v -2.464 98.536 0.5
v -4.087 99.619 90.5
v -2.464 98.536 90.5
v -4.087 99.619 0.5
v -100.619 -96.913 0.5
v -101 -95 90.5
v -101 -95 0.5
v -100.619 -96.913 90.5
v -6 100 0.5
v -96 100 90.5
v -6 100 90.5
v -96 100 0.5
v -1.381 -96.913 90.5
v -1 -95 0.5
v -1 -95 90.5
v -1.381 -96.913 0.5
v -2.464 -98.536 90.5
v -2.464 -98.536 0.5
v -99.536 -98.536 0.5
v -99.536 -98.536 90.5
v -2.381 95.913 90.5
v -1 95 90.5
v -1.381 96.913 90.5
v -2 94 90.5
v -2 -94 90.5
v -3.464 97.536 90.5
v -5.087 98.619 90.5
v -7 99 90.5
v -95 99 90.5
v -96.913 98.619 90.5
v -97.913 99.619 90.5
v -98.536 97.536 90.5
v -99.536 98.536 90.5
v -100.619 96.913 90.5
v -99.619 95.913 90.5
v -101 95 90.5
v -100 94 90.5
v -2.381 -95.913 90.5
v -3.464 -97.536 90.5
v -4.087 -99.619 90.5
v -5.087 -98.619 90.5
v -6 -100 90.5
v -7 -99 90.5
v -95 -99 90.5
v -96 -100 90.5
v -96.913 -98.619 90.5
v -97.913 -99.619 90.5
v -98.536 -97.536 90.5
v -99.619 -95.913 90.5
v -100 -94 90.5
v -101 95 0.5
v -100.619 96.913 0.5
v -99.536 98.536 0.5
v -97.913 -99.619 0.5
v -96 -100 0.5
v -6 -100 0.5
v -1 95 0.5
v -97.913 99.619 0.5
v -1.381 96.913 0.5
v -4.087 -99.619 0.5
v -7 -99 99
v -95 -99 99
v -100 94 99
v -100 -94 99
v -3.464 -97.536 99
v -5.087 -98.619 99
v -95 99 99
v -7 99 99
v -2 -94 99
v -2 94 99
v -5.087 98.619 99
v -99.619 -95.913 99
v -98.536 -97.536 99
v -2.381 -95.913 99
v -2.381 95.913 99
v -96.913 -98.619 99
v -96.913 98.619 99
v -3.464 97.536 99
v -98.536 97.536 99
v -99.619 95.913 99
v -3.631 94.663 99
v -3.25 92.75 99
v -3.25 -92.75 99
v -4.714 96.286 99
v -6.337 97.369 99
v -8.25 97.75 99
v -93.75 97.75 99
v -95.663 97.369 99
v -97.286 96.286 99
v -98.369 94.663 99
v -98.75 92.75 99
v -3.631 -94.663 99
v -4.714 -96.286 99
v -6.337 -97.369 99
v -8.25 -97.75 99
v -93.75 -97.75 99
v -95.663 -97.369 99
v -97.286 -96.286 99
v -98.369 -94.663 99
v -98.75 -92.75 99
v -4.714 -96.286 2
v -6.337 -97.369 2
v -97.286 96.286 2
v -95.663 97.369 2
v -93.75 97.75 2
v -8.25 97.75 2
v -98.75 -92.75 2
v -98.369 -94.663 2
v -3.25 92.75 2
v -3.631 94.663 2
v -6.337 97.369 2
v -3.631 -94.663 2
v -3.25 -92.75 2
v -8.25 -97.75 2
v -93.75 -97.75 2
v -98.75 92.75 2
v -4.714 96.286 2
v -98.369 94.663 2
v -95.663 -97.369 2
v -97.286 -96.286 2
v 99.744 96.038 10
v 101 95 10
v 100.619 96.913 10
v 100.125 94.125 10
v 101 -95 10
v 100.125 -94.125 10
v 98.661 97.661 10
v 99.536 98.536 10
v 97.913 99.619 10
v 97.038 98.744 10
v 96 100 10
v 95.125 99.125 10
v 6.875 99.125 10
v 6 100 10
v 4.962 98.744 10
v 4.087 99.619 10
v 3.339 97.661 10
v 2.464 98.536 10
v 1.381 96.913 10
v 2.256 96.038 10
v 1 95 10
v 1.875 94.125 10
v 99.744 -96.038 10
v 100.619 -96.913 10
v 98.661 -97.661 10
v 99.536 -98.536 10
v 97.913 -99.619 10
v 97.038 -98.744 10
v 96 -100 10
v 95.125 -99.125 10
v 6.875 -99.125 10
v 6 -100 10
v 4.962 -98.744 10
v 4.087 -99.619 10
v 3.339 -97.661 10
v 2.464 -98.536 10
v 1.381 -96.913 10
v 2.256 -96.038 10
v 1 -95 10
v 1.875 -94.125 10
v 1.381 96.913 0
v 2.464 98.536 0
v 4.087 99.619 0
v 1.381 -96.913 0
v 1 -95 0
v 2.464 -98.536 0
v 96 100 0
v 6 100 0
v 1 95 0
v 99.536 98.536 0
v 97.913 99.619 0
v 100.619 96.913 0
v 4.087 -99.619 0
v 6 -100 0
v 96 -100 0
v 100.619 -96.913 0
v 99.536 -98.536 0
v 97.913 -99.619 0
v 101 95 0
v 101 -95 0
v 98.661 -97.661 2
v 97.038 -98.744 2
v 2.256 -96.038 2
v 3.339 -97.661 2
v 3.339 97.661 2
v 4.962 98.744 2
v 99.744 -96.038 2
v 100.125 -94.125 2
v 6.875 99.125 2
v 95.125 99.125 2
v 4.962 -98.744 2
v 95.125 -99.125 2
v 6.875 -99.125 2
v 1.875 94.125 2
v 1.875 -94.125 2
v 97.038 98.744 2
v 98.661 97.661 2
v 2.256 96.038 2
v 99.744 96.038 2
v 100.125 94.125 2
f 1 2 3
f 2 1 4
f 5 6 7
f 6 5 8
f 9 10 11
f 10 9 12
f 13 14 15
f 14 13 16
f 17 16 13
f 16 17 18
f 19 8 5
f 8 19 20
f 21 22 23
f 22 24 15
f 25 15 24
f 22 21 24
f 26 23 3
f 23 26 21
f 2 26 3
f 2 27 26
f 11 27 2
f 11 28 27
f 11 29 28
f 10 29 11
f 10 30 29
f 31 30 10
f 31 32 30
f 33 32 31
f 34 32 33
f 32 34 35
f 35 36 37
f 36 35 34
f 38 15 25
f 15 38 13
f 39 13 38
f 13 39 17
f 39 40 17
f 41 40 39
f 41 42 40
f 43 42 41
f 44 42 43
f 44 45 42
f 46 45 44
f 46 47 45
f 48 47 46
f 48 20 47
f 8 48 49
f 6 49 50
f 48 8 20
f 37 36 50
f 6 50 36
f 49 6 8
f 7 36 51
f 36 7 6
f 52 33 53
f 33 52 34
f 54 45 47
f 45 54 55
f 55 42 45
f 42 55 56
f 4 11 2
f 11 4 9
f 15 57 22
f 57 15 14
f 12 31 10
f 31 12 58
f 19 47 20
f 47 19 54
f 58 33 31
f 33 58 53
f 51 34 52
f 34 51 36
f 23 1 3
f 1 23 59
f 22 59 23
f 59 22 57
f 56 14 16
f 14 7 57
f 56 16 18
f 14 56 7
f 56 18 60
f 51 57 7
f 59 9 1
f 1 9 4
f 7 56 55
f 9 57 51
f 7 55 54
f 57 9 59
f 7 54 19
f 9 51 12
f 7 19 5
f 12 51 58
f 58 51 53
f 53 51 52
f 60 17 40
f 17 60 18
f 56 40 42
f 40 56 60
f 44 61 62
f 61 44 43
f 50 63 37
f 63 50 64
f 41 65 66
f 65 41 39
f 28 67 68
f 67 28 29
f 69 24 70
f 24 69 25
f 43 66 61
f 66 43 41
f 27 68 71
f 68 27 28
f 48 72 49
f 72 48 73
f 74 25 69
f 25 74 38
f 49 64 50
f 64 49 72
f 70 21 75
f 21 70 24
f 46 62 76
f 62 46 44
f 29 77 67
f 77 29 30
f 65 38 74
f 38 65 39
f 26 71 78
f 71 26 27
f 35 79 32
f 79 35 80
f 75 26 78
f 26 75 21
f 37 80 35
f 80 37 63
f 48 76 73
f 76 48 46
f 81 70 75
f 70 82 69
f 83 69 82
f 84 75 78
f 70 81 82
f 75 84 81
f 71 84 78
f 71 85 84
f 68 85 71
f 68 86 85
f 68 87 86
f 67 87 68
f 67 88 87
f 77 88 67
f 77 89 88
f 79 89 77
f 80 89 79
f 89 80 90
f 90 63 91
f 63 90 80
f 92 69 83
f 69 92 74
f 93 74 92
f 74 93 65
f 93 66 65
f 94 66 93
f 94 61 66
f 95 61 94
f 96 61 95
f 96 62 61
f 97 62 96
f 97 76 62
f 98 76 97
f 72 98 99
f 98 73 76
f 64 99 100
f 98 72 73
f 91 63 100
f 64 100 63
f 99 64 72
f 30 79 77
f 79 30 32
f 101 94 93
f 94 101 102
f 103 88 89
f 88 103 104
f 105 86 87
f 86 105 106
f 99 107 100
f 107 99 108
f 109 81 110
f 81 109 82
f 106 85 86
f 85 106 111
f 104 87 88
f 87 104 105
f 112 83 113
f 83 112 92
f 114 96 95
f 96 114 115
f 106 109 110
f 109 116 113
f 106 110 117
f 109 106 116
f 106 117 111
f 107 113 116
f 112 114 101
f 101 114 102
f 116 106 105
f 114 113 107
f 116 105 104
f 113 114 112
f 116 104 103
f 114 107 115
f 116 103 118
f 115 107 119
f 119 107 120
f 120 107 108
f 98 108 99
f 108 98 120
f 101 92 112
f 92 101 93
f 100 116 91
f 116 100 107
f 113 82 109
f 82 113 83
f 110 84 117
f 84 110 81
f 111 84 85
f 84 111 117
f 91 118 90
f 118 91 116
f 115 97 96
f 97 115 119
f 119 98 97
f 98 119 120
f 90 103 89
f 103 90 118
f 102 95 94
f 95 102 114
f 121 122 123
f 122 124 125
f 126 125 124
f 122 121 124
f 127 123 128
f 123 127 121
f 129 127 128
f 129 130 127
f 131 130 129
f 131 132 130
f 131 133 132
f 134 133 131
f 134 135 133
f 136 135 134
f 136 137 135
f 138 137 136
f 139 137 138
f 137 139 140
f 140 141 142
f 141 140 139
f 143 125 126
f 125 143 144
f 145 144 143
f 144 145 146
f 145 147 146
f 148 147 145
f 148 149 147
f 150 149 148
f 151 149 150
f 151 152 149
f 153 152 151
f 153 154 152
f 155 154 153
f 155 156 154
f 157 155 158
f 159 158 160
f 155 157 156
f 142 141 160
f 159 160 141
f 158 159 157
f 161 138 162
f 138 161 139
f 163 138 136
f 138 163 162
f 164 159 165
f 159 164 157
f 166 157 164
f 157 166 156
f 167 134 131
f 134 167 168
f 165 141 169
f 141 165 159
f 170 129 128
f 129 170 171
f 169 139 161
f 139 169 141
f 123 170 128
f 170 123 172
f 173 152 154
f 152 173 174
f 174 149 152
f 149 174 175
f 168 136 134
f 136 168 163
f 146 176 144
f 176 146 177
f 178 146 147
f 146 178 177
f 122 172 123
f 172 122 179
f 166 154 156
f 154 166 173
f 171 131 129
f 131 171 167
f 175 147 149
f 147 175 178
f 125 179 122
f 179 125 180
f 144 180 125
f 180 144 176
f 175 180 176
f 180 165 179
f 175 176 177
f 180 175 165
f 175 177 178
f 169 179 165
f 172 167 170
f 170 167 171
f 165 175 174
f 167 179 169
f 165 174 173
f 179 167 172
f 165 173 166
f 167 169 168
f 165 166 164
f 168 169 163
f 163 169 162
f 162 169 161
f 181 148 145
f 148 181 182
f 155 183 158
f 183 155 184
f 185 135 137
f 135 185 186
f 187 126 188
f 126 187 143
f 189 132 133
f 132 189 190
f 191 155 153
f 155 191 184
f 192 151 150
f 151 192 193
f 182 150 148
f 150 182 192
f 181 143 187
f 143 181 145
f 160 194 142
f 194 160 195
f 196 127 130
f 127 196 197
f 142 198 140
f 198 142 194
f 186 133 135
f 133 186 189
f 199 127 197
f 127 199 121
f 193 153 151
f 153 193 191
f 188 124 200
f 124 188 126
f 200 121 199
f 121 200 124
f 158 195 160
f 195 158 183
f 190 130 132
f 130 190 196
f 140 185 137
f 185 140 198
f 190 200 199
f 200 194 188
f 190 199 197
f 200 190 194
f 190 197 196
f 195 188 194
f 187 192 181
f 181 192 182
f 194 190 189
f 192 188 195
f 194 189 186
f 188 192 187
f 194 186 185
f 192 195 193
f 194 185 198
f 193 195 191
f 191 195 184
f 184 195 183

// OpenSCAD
// http://www.thingiverse.com/thing:213934

// ================ variables

//CUSTOMIZER VARIABLES

/* [Main] */

// in mm
x_width=100;

// in mm
y_width=200;

// in mm
height=50;

// Wall thickness in mm
thickness=2; // [1:10]

// Corner roundover in mm (0=sharp corner)
radius=5; // [0:50]

// Generate the box
do_box=1; // [0:no,1:yes]

// Generate a lid
do_lid=1; // [0:no,1:yes]

// height in mm
lid_thickness=5;

//CUSTOMIZER VARIABLES END

// Screw pilot hole size
screw_pilot=1.125*1;

// Screw hole size
screw_hole=2.5*1;

// Whether you want the screw countersunk
screw_countersink=0*1;

// =============== calculated variables
lid_height=min(height/4,lid_thickness);
corner_radius=min(radius,x_width/2,y_width/2);
xadj=x_width-(corner_radius*2);
yadj=y_width-(corner_radius*2);
snugfit=0.5/2;

// =============== program

// ---- The box
if(do_box==1) translate([-((x_width/2+1)*do_lid),0,height/2-thickness]) difference() {

union() {
minkowski() // main body
{
 cube([xadj,yadj,height-lid_height],center=true);
 cylinder(r=corner_radius,h=height-lid_height);
}

translate([0,0,lid_height-thickness]) minkowski() // main body overlap
{
 cube([xadj-thickness,yadj-thickness,height-(thickness*2)],center=true);
 cylinder(r=corner_radius,h=height);
}
}

translate([0,0,thickness*2]) minkowski() // inside area
{
 cube([xadj-((thickness+snugfit)*2),yadj-((thickness+snugfit)*2),height],center=true);
 cylinder(r=corner_radius,h=height);
}

};

// ---- The lid
if(do_lid==1) translate([(x_width/2+1)*do_box,0,lid_height/2]) {

difference() {
minkowski() // main body
{
 cube([xadj,yadj,lid_height],center=true);
 cylinder(r=corner_radius,h=lid_height);
}

translate([0,0,thickness]) minkowski() // inside area
{
 cube([xadj-(thickness-snugfit),yadj-(thickness-snugfit),lid_height],center=true);
 cylinder(r=corner_radius,h=lid_height);
}
}

};

